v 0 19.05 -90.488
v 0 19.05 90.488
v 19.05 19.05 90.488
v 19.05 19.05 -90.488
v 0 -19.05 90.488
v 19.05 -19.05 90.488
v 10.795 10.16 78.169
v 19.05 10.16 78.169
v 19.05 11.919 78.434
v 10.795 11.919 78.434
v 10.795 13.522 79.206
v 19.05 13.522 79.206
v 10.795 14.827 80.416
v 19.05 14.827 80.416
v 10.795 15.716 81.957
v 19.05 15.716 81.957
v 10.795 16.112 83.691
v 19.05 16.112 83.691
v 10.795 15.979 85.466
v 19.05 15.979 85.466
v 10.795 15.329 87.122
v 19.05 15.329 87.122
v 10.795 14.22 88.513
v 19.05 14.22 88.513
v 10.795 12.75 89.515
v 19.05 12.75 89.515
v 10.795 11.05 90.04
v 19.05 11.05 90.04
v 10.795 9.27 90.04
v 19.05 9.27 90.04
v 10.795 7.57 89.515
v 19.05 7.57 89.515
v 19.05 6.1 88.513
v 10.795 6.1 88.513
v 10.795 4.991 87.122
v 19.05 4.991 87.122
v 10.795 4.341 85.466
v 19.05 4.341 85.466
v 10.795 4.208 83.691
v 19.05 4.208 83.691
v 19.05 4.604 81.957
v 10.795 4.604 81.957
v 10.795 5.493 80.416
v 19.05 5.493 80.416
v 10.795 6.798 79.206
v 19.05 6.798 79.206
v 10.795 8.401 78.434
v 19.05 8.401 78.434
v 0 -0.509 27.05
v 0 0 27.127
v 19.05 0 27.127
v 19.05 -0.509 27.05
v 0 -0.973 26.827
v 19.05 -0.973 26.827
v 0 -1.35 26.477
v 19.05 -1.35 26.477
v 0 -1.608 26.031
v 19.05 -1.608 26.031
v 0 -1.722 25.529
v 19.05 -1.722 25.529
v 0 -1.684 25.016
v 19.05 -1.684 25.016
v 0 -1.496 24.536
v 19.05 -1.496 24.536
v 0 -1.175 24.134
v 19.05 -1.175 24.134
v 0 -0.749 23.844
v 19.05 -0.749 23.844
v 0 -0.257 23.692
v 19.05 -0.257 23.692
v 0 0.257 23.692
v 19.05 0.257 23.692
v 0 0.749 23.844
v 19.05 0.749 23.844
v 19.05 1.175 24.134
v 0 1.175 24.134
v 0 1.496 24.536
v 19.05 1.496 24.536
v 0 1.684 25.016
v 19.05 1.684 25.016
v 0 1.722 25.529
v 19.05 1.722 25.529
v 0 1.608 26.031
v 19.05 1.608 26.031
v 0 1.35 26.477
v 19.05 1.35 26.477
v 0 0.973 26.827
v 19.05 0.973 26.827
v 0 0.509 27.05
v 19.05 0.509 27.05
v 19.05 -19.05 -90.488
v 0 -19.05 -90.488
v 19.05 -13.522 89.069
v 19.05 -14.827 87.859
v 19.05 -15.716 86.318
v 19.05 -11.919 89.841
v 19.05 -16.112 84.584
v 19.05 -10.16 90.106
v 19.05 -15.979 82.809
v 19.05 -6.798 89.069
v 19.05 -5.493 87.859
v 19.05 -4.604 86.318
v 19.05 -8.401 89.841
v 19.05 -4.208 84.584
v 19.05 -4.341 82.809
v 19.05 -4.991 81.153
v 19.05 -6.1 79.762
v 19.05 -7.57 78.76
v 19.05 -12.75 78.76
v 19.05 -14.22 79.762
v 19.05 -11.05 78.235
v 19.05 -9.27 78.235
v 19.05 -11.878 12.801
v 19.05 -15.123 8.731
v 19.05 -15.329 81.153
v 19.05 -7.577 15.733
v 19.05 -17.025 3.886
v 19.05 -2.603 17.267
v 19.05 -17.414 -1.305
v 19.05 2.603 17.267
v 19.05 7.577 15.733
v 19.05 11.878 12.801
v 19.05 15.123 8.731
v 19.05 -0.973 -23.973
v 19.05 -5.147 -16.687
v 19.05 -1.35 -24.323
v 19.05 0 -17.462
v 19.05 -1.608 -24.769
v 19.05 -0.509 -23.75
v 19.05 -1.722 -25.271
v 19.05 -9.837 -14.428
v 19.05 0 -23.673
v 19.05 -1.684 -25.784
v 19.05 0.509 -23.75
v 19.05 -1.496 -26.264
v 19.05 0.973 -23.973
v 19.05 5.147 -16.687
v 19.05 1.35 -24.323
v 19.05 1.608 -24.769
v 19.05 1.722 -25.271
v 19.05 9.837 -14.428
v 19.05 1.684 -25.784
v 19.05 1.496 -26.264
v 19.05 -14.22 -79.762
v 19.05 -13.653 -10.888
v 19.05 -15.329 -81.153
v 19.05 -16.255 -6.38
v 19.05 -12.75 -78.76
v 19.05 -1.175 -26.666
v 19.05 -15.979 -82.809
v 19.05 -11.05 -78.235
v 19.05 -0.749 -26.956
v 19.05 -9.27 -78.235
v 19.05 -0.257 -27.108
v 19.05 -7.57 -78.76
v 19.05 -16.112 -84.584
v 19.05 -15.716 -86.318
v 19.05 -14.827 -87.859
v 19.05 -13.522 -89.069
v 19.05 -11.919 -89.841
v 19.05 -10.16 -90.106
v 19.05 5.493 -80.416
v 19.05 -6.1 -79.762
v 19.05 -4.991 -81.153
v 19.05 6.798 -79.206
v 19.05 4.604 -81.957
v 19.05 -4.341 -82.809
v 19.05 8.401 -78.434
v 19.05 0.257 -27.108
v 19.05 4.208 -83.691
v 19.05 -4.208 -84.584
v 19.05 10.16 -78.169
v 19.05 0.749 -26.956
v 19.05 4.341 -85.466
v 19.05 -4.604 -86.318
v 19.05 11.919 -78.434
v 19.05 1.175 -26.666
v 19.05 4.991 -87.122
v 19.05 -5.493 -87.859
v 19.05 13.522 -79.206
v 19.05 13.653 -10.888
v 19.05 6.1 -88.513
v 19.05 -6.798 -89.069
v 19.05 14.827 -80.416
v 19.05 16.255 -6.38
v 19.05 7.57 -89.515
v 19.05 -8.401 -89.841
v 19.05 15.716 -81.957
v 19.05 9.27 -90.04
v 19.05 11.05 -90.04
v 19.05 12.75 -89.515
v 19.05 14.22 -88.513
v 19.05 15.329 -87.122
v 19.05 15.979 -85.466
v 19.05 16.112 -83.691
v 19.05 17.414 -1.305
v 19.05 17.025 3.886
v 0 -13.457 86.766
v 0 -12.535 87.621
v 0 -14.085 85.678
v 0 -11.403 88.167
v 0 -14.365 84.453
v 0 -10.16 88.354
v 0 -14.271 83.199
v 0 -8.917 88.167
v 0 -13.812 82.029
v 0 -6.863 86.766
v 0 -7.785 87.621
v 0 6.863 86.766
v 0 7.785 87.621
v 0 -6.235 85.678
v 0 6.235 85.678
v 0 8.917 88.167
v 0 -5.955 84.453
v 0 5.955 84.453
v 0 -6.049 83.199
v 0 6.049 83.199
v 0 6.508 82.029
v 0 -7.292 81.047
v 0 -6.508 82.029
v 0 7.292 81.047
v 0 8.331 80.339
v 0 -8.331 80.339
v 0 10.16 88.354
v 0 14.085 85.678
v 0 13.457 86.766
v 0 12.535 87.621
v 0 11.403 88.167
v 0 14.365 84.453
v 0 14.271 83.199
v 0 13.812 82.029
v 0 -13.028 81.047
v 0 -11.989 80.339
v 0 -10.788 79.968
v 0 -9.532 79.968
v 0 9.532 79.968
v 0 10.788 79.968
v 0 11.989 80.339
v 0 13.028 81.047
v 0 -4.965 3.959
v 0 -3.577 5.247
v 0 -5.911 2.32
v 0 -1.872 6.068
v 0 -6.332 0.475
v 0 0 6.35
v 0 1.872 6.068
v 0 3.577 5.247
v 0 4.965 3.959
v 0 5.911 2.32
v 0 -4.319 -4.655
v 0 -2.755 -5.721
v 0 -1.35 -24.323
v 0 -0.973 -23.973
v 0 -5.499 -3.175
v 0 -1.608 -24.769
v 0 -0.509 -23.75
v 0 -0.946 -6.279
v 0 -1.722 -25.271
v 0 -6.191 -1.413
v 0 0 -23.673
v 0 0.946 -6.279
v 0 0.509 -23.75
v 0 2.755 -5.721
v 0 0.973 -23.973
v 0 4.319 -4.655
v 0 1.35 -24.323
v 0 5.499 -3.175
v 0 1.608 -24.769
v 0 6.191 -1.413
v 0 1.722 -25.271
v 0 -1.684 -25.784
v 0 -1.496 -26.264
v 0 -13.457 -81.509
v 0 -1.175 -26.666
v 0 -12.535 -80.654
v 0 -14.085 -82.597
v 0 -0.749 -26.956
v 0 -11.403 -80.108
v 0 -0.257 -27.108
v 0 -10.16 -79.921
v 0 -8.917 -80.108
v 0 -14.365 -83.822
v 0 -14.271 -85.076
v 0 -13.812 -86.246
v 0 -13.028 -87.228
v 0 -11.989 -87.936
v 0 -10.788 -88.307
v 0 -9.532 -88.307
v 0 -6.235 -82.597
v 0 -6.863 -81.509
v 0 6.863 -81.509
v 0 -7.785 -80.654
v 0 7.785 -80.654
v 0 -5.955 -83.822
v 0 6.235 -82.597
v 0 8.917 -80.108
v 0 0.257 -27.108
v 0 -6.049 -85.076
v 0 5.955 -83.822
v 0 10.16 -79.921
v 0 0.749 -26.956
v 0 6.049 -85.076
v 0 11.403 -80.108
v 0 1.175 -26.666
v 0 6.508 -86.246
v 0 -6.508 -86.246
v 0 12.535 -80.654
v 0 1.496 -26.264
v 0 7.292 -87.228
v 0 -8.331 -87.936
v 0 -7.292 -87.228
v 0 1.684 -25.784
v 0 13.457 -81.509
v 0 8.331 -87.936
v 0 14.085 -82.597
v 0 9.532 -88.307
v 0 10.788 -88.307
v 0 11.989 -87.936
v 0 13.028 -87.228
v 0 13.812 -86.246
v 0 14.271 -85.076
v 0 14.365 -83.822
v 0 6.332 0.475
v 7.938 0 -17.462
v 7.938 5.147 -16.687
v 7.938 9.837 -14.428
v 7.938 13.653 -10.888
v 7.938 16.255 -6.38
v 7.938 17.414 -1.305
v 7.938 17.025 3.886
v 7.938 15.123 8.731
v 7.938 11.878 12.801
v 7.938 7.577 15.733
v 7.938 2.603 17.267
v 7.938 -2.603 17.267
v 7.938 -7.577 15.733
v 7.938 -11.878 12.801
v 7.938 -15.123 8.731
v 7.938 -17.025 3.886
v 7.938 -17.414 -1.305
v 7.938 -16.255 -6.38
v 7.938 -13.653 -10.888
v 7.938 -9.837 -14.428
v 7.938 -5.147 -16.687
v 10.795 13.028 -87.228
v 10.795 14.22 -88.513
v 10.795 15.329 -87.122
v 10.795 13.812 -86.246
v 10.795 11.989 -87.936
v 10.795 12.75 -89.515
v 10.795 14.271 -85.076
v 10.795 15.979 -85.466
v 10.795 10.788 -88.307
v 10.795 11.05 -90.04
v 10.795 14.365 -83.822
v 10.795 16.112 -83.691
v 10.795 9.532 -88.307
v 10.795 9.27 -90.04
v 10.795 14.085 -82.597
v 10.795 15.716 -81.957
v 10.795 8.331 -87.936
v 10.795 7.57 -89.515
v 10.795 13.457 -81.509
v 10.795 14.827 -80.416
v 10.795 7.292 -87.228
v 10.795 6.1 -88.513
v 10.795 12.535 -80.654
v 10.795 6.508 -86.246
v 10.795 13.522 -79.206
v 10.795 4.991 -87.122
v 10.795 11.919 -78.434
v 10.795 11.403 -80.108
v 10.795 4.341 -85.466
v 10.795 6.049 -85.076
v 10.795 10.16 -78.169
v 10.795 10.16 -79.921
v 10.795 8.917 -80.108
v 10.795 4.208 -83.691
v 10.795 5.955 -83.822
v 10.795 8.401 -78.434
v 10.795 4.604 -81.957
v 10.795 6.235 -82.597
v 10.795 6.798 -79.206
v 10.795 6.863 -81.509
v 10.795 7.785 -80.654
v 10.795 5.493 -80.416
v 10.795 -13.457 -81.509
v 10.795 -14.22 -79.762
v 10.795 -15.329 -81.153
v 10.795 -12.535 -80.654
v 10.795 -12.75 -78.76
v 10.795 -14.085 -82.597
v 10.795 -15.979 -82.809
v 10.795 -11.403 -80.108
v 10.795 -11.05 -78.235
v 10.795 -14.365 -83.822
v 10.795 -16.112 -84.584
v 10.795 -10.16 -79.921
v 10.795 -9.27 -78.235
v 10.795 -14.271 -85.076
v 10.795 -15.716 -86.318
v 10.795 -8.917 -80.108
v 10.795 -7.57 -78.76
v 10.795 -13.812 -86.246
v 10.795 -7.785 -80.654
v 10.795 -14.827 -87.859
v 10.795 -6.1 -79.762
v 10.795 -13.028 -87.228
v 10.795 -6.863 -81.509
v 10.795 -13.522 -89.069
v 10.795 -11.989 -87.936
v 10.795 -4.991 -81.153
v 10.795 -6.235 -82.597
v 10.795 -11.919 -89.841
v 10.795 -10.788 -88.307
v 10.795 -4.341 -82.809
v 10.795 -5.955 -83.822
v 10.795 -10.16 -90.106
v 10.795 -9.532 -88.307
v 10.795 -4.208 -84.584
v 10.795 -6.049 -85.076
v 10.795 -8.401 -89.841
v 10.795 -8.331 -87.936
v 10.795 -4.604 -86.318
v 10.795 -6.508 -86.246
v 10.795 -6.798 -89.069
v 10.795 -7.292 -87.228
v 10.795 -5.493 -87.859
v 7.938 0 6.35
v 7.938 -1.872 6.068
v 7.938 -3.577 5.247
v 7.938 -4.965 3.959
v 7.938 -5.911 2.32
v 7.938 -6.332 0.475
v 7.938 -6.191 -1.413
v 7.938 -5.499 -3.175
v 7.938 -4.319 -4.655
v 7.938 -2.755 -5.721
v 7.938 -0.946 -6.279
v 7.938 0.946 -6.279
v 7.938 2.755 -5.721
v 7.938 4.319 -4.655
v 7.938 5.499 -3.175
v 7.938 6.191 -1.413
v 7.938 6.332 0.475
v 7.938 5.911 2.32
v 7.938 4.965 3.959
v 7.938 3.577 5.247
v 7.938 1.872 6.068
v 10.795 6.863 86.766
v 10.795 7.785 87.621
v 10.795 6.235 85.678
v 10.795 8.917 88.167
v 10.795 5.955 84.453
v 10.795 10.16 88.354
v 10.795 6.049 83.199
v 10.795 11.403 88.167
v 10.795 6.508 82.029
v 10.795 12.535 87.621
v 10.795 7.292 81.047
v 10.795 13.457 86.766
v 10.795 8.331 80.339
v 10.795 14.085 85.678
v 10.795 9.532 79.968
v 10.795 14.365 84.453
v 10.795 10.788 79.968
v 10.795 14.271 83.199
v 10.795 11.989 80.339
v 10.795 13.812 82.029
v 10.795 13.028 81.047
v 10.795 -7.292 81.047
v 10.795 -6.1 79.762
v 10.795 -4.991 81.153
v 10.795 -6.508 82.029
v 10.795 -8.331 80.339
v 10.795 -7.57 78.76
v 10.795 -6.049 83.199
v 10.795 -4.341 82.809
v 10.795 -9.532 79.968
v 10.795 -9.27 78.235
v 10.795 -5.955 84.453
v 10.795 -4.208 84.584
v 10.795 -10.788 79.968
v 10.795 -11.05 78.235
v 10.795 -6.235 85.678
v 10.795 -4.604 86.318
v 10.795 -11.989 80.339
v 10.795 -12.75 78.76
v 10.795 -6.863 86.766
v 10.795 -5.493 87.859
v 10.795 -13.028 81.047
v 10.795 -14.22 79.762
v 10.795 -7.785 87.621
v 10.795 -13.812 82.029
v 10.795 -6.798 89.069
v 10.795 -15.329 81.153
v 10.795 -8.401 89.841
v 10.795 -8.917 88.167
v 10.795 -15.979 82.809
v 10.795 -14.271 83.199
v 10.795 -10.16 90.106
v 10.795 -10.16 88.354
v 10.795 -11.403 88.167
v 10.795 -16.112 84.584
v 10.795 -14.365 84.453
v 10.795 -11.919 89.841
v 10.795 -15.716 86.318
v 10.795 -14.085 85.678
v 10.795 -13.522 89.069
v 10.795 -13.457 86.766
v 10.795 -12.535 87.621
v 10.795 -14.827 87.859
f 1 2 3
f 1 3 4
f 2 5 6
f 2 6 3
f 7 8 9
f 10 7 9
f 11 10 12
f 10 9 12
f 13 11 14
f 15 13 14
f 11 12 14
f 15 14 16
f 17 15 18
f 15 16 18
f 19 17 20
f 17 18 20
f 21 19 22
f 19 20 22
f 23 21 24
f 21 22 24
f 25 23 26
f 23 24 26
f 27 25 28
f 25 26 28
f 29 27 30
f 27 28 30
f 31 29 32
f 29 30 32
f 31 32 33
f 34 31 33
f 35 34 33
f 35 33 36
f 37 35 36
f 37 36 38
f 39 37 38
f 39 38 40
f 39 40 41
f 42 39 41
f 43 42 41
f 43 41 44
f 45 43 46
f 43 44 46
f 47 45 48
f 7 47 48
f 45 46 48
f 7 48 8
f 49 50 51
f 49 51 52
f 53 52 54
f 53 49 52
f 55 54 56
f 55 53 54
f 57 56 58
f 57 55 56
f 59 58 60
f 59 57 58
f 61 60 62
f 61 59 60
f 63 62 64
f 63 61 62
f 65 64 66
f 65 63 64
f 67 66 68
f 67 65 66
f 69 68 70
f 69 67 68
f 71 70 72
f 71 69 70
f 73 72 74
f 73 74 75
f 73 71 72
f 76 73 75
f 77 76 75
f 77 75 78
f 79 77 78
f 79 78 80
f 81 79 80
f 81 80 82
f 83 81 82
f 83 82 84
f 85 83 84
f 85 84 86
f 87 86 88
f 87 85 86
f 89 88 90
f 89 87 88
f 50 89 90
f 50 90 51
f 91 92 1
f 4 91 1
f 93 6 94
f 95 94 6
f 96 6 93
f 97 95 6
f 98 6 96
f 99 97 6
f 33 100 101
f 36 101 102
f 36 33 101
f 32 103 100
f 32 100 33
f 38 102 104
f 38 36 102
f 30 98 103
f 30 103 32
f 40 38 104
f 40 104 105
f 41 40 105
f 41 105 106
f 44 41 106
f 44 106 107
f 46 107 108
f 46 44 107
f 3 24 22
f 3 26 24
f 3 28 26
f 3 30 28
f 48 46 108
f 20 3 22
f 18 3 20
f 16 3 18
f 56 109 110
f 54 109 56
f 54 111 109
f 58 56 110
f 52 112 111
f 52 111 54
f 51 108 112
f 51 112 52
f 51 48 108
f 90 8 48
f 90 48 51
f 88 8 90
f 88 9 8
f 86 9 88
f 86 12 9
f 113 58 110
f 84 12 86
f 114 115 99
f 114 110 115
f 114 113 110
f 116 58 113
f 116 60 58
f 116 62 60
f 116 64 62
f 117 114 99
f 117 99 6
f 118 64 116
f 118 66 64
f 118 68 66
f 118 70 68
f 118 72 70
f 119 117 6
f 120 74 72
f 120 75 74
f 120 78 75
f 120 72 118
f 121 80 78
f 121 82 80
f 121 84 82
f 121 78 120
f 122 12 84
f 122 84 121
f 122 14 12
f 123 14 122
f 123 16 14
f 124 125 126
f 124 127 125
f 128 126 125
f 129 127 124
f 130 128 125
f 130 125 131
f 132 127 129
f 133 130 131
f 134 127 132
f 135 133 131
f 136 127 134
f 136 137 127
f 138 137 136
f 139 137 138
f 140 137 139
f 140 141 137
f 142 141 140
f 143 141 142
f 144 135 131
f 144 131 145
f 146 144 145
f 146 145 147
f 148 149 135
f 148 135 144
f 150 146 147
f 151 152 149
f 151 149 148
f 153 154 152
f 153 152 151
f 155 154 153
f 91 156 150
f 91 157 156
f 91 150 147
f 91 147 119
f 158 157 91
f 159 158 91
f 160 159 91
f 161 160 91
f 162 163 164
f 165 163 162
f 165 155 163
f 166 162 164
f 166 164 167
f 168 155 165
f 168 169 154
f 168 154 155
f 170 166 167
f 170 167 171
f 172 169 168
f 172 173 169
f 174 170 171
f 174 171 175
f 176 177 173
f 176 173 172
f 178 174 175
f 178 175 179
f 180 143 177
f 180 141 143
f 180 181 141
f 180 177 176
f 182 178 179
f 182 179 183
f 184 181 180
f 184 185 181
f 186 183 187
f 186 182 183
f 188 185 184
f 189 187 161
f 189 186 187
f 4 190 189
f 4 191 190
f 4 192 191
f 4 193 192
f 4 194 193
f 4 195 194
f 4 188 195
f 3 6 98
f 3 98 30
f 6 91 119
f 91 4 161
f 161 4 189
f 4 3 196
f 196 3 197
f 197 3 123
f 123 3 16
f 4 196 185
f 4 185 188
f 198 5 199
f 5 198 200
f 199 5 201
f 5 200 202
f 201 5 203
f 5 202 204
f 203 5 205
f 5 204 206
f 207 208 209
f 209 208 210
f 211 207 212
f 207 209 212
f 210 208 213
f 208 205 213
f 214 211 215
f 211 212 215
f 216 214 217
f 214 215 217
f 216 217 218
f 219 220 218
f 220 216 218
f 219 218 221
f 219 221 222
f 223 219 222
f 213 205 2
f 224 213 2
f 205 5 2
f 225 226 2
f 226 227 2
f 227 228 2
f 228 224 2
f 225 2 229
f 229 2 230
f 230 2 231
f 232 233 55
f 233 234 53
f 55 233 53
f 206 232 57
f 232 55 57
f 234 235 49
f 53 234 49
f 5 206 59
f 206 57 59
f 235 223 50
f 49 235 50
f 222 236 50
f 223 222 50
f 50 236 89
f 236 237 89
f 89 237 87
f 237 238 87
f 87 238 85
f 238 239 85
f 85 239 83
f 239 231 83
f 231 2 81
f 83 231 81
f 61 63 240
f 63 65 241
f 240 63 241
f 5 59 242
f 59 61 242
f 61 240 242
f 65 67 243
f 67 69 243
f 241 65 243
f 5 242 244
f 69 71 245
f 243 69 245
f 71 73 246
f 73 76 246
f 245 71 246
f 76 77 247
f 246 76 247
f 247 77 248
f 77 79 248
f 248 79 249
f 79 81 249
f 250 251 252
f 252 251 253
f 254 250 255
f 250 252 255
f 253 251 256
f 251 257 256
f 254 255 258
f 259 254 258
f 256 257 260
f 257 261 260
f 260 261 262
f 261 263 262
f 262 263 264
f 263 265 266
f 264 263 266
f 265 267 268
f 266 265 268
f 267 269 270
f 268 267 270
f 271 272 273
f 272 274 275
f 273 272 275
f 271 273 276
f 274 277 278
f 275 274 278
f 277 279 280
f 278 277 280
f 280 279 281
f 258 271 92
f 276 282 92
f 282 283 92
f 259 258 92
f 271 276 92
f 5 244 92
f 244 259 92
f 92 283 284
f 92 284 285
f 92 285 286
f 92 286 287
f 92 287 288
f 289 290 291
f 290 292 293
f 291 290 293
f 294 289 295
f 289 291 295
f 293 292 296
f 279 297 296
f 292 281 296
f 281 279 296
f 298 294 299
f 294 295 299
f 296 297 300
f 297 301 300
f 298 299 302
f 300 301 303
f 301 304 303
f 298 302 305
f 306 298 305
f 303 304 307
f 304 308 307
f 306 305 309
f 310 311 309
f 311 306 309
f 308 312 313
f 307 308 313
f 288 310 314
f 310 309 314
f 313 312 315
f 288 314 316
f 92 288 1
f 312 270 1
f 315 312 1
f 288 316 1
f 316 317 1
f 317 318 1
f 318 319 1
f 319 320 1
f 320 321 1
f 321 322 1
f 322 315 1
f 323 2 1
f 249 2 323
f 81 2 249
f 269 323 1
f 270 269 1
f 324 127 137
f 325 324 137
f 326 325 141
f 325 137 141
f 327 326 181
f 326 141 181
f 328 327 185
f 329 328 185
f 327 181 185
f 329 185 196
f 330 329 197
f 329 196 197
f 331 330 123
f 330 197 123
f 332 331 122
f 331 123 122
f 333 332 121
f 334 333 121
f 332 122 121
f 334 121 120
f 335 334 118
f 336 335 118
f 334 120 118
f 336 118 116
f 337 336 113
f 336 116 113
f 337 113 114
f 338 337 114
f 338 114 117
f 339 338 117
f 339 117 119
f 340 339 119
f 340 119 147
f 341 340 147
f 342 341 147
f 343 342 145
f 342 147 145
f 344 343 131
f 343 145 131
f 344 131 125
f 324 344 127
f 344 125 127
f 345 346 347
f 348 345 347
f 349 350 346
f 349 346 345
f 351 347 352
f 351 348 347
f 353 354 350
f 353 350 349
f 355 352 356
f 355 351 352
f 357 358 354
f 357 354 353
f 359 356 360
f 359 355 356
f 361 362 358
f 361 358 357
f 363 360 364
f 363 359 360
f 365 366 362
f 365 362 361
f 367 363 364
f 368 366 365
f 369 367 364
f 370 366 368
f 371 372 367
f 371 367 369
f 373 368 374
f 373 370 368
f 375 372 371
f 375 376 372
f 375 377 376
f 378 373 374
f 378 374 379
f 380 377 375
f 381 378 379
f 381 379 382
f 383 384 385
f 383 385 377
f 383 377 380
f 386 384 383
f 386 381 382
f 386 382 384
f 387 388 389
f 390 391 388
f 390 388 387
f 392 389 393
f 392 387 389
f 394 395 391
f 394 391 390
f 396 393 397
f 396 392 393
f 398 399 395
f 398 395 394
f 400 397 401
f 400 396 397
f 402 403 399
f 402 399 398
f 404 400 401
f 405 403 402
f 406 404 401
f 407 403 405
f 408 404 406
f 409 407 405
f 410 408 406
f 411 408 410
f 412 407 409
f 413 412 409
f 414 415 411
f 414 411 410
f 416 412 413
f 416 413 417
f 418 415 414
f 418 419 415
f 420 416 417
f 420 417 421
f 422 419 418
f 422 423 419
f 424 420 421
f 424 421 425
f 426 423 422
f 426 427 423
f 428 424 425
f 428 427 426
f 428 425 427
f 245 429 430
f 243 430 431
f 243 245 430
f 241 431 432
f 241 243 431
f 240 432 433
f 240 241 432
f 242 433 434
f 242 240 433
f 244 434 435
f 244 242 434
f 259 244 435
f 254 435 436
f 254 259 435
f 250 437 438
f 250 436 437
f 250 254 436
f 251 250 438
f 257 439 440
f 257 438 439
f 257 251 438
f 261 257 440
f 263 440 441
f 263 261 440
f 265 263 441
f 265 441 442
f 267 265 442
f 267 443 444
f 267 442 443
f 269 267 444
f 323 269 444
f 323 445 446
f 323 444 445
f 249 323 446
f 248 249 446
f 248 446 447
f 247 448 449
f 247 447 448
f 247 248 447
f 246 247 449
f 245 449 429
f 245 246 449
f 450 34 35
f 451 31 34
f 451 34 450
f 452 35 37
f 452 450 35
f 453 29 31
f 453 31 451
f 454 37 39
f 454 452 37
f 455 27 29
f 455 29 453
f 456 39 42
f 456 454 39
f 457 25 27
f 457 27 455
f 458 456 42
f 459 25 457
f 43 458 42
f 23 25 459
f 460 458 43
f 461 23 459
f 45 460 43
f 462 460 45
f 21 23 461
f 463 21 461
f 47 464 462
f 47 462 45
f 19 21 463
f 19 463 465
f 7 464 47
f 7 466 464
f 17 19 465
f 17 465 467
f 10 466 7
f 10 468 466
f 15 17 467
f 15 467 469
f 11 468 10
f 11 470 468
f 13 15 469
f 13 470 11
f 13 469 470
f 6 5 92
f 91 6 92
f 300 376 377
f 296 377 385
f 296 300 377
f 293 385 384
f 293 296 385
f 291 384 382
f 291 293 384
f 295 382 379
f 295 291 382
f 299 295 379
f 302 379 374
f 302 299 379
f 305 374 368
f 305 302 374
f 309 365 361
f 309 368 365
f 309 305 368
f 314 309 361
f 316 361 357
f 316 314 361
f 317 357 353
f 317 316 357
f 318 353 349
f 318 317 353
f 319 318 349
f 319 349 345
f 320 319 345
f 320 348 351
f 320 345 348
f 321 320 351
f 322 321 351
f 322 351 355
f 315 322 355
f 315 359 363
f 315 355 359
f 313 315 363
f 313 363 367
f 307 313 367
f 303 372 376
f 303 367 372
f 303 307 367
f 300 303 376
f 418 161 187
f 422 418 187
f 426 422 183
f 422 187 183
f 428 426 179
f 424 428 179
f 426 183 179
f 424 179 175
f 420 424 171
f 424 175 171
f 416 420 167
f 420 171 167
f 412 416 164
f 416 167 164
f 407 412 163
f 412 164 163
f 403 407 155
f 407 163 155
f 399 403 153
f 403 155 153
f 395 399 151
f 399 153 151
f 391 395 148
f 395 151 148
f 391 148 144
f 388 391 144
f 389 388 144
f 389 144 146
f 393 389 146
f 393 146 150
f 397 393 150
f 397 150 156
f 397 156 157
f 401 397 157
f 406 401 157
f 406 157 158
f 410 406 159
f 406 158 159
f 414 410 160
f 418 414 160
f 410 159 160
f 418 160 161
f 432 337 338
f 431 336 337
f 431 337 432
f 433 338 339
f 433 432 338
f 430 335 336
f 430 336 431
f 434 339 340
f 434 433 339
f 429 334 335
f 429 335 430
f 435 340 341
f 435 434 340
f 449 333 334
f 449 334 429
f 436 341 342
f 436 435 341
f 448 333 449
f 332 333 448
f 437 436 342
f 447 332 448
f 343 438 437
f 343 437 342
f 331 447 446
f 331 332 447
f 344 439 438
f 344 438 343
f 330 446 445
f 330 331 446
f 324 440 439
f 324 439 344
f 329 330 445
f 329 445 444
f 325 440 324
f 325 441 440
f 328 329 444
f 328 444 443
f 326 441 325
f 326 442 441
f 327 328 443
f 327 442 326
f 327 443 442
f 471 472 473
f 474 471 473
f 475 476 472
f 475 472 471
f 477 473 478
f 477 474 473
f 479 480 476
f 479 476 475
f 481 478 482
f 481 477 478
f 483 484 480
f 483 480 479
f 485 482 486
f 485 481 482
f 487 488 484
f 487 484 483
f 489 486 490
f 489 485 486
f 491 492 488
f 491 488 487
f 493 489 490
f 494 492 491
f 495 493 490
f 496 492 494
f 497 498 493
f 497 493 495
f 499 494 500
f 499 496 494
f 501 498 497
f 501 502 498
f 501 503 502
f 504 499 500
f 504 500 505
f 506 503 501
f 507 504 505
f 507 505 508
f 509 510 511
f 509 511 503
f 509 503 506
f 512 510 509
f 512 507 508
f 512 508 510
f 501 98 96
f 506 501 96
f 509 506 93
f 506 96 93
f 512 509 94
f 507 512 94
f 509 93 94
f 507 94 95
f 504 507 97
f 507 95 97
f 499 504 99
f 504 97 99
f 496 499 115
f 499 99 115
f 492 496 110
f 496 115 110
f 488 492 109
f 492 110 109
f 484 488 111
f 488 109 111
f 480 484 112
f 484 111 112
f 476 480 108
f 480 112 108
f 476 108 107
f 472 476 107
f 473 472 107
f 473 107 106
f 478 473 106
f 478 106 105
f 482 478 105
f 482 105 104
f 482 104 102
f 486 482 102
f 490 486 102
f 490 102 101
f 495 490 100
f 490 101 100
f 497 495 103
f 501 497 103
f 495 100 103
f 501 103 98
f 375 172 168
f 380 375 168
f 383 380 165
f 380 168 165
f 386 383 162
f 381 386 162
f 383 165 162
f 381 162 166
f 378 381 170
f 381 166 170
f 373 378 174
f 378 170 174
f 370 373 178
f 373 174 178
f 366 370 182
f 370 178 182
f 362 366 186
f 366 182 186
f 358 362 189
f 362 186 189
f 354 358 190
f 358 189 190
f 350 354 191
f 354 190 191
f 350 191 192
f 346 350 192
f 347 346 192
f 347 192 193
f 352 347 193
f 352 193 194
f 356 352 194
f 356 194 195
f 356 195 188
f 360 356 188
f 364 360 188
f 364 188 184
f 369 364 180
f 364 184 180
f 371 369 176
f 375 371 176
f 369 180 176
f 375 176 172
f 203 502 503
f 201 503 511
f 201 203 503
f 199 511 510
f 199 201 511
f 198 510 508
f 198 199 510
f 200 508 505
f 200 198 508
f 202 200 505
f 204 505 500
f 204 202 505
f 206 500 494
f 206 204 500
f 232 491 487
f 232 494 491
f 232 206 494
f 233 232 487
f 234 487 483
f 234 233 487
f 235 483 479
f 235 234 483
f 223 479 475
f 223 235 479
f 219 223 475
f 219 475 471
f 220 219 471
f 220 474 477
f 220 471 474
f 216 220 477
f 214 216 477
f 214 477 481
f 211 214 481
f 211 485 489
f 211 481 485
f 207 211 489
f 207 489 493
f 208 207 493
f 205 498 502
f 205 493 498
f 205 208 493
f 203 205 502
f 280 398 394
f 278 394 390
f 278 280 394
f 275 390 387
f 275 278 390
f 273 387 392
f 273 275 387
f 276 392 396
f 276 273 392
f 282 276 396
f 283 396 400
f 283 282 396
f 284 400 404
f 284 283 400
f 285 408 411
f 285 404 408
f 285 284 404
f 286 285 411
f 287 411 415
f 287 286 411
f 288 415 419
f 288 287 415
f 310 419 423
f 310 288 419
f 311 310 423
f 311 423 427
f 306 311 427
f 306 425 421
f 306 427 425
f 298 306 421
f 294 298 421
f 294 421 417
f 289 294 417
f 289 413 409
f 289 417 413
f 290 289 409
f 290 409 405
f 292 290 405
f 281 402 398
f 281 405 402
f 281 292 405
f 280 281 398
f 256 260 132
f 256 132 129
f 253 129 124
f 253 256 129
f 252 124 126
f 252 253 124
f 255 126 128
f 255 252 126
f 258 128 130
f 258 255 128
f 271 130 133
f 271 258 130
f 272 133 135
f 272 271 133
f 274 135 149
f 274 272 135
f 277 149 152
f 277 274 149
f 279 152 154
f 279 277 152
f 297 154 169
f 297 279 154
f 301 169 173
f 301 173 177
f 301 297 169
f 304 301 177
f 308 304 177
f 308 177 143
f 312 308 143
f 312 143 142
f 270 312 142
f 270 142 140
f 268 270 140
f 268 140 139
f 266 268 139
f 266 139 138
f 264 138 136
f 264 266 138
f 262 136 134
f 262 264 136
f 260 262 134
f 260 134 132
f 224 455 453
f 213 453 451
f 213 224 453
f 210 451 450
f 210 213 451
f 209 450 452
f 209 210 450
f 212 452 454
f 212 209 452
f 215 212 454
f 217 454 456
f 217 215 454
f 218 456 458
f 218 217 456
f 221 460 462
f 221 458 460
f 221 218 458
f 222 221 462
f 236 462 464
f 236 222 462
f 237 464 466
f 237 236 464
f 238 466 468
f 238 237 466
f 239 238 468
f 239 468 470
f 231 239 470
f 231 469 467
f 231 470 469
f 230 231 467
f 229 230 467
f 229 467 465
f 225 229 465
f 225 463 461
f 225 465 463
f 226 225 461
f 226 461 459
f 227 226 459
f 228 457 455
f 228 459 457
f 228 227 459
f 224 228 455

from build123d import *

# Parameters (mm, degrees)
SKETCH1_W           = 180.975
SKETCH1_H           = 38.1
SKETCH1_R           = 6.35
SKETCH1_R_2         = 1.7272
SKETCH1_R_3         = 4.2164
BOSS_EXTRUDE1_DEPTH = 19.05
SKETCH2_R           = 5.969
CUT_EXTRUDE2_DEPTH  = 8.255
SKETCH3_R           = 17.4625
CUT_EXTRUDE3_DEPTH  = 11.1125


with BuildPart() as part:
    # Sketch1 → Boss-Extrude1 (new body)
    with BuildSketch(Plane(origin=(0, 0, 0), x_dir=(0, 0, -1), z_dir=(1, 0, 0))):
        Rectangle(SKETCH1_W, SKETCH1_H)
        with Locations(Location((0, 0, 0), (0, 0, 180))):
            Circle(SKETCH1_R, mode=Mode.SUBTRACT)
        with Locations(Location((-25.4, 0, 0), (0, 0, 180))):
            Circle(SKETCH1_R_2, mode=Mode.SUBTRACT)
        with Locations(Location((-84.1375, 10.16, 0), (0, 0, 180))):
            Circle(SKETCH1_R_3, mode=Mode.SUBTRACT)
        with Locations(Location((-84.1375, -10.16, 0), (0, 0, 180))):
            Circle(SKETCH1_R_3, mode=Mode.SUBTRACT)
        with Locations(Location((25.4, 0, 0), (0, 0, 180))):
            Circle(SKETCH1_R_2, mode=Mode.SUBTRACT)
        with Locations(Location((84.1375, -10.16, 0), (0, 0, 180))):
            Circle(SKETCH1_R_3, mode=Mode.SUBTRACT)
        with Locations(Location((84.1375, 10.16, 0), (0, 0, 180))):
            Circle(SKETCH1_R_3, mode=Mode.SUBTRACT)
    extrude(amount=BOSS_EXTRUDE1_DEPTH)

    # Sketch2 → Cut-Extrude2 (cut)
    with BuildSketch(Plane(origin=(19.05, 0, 0), x_dir=(0, 0, -1), z_dir=(1, 0, 0))):
        with Locations((-84.1375, 10.16)):
            Circle(SKETCH2_R)
        with Locations(Location((-84.1375, -10.16, 0), (0, 0, 180))):
            Circle(SKETCH2_R)
        with Locations((84.1375, -10.16)):
            Circle(SKETCH2_R)
        with Locations(Location((84.1375, 10.16, 0), (0, 0, 180))):
            Circle(SKETCH2_R)
    extrude(amount=-CUT_EXTRUDE2_DEPTH, mode=Mode.SUBTRACT)

    # Sketch3 → Cut-Extrude3 (cut)
    with BuildSketch(Plane(origin=(19.05, 0, 0), x_dir=(0, 0, -1), z_dir=(1, 0, 0))):
        Circle(SKETCH3_R)
    extrude(amount=-CUT_EXTRUDE3_DEPTH, mode=Mode.SUBTRACT)


solid = part.part
